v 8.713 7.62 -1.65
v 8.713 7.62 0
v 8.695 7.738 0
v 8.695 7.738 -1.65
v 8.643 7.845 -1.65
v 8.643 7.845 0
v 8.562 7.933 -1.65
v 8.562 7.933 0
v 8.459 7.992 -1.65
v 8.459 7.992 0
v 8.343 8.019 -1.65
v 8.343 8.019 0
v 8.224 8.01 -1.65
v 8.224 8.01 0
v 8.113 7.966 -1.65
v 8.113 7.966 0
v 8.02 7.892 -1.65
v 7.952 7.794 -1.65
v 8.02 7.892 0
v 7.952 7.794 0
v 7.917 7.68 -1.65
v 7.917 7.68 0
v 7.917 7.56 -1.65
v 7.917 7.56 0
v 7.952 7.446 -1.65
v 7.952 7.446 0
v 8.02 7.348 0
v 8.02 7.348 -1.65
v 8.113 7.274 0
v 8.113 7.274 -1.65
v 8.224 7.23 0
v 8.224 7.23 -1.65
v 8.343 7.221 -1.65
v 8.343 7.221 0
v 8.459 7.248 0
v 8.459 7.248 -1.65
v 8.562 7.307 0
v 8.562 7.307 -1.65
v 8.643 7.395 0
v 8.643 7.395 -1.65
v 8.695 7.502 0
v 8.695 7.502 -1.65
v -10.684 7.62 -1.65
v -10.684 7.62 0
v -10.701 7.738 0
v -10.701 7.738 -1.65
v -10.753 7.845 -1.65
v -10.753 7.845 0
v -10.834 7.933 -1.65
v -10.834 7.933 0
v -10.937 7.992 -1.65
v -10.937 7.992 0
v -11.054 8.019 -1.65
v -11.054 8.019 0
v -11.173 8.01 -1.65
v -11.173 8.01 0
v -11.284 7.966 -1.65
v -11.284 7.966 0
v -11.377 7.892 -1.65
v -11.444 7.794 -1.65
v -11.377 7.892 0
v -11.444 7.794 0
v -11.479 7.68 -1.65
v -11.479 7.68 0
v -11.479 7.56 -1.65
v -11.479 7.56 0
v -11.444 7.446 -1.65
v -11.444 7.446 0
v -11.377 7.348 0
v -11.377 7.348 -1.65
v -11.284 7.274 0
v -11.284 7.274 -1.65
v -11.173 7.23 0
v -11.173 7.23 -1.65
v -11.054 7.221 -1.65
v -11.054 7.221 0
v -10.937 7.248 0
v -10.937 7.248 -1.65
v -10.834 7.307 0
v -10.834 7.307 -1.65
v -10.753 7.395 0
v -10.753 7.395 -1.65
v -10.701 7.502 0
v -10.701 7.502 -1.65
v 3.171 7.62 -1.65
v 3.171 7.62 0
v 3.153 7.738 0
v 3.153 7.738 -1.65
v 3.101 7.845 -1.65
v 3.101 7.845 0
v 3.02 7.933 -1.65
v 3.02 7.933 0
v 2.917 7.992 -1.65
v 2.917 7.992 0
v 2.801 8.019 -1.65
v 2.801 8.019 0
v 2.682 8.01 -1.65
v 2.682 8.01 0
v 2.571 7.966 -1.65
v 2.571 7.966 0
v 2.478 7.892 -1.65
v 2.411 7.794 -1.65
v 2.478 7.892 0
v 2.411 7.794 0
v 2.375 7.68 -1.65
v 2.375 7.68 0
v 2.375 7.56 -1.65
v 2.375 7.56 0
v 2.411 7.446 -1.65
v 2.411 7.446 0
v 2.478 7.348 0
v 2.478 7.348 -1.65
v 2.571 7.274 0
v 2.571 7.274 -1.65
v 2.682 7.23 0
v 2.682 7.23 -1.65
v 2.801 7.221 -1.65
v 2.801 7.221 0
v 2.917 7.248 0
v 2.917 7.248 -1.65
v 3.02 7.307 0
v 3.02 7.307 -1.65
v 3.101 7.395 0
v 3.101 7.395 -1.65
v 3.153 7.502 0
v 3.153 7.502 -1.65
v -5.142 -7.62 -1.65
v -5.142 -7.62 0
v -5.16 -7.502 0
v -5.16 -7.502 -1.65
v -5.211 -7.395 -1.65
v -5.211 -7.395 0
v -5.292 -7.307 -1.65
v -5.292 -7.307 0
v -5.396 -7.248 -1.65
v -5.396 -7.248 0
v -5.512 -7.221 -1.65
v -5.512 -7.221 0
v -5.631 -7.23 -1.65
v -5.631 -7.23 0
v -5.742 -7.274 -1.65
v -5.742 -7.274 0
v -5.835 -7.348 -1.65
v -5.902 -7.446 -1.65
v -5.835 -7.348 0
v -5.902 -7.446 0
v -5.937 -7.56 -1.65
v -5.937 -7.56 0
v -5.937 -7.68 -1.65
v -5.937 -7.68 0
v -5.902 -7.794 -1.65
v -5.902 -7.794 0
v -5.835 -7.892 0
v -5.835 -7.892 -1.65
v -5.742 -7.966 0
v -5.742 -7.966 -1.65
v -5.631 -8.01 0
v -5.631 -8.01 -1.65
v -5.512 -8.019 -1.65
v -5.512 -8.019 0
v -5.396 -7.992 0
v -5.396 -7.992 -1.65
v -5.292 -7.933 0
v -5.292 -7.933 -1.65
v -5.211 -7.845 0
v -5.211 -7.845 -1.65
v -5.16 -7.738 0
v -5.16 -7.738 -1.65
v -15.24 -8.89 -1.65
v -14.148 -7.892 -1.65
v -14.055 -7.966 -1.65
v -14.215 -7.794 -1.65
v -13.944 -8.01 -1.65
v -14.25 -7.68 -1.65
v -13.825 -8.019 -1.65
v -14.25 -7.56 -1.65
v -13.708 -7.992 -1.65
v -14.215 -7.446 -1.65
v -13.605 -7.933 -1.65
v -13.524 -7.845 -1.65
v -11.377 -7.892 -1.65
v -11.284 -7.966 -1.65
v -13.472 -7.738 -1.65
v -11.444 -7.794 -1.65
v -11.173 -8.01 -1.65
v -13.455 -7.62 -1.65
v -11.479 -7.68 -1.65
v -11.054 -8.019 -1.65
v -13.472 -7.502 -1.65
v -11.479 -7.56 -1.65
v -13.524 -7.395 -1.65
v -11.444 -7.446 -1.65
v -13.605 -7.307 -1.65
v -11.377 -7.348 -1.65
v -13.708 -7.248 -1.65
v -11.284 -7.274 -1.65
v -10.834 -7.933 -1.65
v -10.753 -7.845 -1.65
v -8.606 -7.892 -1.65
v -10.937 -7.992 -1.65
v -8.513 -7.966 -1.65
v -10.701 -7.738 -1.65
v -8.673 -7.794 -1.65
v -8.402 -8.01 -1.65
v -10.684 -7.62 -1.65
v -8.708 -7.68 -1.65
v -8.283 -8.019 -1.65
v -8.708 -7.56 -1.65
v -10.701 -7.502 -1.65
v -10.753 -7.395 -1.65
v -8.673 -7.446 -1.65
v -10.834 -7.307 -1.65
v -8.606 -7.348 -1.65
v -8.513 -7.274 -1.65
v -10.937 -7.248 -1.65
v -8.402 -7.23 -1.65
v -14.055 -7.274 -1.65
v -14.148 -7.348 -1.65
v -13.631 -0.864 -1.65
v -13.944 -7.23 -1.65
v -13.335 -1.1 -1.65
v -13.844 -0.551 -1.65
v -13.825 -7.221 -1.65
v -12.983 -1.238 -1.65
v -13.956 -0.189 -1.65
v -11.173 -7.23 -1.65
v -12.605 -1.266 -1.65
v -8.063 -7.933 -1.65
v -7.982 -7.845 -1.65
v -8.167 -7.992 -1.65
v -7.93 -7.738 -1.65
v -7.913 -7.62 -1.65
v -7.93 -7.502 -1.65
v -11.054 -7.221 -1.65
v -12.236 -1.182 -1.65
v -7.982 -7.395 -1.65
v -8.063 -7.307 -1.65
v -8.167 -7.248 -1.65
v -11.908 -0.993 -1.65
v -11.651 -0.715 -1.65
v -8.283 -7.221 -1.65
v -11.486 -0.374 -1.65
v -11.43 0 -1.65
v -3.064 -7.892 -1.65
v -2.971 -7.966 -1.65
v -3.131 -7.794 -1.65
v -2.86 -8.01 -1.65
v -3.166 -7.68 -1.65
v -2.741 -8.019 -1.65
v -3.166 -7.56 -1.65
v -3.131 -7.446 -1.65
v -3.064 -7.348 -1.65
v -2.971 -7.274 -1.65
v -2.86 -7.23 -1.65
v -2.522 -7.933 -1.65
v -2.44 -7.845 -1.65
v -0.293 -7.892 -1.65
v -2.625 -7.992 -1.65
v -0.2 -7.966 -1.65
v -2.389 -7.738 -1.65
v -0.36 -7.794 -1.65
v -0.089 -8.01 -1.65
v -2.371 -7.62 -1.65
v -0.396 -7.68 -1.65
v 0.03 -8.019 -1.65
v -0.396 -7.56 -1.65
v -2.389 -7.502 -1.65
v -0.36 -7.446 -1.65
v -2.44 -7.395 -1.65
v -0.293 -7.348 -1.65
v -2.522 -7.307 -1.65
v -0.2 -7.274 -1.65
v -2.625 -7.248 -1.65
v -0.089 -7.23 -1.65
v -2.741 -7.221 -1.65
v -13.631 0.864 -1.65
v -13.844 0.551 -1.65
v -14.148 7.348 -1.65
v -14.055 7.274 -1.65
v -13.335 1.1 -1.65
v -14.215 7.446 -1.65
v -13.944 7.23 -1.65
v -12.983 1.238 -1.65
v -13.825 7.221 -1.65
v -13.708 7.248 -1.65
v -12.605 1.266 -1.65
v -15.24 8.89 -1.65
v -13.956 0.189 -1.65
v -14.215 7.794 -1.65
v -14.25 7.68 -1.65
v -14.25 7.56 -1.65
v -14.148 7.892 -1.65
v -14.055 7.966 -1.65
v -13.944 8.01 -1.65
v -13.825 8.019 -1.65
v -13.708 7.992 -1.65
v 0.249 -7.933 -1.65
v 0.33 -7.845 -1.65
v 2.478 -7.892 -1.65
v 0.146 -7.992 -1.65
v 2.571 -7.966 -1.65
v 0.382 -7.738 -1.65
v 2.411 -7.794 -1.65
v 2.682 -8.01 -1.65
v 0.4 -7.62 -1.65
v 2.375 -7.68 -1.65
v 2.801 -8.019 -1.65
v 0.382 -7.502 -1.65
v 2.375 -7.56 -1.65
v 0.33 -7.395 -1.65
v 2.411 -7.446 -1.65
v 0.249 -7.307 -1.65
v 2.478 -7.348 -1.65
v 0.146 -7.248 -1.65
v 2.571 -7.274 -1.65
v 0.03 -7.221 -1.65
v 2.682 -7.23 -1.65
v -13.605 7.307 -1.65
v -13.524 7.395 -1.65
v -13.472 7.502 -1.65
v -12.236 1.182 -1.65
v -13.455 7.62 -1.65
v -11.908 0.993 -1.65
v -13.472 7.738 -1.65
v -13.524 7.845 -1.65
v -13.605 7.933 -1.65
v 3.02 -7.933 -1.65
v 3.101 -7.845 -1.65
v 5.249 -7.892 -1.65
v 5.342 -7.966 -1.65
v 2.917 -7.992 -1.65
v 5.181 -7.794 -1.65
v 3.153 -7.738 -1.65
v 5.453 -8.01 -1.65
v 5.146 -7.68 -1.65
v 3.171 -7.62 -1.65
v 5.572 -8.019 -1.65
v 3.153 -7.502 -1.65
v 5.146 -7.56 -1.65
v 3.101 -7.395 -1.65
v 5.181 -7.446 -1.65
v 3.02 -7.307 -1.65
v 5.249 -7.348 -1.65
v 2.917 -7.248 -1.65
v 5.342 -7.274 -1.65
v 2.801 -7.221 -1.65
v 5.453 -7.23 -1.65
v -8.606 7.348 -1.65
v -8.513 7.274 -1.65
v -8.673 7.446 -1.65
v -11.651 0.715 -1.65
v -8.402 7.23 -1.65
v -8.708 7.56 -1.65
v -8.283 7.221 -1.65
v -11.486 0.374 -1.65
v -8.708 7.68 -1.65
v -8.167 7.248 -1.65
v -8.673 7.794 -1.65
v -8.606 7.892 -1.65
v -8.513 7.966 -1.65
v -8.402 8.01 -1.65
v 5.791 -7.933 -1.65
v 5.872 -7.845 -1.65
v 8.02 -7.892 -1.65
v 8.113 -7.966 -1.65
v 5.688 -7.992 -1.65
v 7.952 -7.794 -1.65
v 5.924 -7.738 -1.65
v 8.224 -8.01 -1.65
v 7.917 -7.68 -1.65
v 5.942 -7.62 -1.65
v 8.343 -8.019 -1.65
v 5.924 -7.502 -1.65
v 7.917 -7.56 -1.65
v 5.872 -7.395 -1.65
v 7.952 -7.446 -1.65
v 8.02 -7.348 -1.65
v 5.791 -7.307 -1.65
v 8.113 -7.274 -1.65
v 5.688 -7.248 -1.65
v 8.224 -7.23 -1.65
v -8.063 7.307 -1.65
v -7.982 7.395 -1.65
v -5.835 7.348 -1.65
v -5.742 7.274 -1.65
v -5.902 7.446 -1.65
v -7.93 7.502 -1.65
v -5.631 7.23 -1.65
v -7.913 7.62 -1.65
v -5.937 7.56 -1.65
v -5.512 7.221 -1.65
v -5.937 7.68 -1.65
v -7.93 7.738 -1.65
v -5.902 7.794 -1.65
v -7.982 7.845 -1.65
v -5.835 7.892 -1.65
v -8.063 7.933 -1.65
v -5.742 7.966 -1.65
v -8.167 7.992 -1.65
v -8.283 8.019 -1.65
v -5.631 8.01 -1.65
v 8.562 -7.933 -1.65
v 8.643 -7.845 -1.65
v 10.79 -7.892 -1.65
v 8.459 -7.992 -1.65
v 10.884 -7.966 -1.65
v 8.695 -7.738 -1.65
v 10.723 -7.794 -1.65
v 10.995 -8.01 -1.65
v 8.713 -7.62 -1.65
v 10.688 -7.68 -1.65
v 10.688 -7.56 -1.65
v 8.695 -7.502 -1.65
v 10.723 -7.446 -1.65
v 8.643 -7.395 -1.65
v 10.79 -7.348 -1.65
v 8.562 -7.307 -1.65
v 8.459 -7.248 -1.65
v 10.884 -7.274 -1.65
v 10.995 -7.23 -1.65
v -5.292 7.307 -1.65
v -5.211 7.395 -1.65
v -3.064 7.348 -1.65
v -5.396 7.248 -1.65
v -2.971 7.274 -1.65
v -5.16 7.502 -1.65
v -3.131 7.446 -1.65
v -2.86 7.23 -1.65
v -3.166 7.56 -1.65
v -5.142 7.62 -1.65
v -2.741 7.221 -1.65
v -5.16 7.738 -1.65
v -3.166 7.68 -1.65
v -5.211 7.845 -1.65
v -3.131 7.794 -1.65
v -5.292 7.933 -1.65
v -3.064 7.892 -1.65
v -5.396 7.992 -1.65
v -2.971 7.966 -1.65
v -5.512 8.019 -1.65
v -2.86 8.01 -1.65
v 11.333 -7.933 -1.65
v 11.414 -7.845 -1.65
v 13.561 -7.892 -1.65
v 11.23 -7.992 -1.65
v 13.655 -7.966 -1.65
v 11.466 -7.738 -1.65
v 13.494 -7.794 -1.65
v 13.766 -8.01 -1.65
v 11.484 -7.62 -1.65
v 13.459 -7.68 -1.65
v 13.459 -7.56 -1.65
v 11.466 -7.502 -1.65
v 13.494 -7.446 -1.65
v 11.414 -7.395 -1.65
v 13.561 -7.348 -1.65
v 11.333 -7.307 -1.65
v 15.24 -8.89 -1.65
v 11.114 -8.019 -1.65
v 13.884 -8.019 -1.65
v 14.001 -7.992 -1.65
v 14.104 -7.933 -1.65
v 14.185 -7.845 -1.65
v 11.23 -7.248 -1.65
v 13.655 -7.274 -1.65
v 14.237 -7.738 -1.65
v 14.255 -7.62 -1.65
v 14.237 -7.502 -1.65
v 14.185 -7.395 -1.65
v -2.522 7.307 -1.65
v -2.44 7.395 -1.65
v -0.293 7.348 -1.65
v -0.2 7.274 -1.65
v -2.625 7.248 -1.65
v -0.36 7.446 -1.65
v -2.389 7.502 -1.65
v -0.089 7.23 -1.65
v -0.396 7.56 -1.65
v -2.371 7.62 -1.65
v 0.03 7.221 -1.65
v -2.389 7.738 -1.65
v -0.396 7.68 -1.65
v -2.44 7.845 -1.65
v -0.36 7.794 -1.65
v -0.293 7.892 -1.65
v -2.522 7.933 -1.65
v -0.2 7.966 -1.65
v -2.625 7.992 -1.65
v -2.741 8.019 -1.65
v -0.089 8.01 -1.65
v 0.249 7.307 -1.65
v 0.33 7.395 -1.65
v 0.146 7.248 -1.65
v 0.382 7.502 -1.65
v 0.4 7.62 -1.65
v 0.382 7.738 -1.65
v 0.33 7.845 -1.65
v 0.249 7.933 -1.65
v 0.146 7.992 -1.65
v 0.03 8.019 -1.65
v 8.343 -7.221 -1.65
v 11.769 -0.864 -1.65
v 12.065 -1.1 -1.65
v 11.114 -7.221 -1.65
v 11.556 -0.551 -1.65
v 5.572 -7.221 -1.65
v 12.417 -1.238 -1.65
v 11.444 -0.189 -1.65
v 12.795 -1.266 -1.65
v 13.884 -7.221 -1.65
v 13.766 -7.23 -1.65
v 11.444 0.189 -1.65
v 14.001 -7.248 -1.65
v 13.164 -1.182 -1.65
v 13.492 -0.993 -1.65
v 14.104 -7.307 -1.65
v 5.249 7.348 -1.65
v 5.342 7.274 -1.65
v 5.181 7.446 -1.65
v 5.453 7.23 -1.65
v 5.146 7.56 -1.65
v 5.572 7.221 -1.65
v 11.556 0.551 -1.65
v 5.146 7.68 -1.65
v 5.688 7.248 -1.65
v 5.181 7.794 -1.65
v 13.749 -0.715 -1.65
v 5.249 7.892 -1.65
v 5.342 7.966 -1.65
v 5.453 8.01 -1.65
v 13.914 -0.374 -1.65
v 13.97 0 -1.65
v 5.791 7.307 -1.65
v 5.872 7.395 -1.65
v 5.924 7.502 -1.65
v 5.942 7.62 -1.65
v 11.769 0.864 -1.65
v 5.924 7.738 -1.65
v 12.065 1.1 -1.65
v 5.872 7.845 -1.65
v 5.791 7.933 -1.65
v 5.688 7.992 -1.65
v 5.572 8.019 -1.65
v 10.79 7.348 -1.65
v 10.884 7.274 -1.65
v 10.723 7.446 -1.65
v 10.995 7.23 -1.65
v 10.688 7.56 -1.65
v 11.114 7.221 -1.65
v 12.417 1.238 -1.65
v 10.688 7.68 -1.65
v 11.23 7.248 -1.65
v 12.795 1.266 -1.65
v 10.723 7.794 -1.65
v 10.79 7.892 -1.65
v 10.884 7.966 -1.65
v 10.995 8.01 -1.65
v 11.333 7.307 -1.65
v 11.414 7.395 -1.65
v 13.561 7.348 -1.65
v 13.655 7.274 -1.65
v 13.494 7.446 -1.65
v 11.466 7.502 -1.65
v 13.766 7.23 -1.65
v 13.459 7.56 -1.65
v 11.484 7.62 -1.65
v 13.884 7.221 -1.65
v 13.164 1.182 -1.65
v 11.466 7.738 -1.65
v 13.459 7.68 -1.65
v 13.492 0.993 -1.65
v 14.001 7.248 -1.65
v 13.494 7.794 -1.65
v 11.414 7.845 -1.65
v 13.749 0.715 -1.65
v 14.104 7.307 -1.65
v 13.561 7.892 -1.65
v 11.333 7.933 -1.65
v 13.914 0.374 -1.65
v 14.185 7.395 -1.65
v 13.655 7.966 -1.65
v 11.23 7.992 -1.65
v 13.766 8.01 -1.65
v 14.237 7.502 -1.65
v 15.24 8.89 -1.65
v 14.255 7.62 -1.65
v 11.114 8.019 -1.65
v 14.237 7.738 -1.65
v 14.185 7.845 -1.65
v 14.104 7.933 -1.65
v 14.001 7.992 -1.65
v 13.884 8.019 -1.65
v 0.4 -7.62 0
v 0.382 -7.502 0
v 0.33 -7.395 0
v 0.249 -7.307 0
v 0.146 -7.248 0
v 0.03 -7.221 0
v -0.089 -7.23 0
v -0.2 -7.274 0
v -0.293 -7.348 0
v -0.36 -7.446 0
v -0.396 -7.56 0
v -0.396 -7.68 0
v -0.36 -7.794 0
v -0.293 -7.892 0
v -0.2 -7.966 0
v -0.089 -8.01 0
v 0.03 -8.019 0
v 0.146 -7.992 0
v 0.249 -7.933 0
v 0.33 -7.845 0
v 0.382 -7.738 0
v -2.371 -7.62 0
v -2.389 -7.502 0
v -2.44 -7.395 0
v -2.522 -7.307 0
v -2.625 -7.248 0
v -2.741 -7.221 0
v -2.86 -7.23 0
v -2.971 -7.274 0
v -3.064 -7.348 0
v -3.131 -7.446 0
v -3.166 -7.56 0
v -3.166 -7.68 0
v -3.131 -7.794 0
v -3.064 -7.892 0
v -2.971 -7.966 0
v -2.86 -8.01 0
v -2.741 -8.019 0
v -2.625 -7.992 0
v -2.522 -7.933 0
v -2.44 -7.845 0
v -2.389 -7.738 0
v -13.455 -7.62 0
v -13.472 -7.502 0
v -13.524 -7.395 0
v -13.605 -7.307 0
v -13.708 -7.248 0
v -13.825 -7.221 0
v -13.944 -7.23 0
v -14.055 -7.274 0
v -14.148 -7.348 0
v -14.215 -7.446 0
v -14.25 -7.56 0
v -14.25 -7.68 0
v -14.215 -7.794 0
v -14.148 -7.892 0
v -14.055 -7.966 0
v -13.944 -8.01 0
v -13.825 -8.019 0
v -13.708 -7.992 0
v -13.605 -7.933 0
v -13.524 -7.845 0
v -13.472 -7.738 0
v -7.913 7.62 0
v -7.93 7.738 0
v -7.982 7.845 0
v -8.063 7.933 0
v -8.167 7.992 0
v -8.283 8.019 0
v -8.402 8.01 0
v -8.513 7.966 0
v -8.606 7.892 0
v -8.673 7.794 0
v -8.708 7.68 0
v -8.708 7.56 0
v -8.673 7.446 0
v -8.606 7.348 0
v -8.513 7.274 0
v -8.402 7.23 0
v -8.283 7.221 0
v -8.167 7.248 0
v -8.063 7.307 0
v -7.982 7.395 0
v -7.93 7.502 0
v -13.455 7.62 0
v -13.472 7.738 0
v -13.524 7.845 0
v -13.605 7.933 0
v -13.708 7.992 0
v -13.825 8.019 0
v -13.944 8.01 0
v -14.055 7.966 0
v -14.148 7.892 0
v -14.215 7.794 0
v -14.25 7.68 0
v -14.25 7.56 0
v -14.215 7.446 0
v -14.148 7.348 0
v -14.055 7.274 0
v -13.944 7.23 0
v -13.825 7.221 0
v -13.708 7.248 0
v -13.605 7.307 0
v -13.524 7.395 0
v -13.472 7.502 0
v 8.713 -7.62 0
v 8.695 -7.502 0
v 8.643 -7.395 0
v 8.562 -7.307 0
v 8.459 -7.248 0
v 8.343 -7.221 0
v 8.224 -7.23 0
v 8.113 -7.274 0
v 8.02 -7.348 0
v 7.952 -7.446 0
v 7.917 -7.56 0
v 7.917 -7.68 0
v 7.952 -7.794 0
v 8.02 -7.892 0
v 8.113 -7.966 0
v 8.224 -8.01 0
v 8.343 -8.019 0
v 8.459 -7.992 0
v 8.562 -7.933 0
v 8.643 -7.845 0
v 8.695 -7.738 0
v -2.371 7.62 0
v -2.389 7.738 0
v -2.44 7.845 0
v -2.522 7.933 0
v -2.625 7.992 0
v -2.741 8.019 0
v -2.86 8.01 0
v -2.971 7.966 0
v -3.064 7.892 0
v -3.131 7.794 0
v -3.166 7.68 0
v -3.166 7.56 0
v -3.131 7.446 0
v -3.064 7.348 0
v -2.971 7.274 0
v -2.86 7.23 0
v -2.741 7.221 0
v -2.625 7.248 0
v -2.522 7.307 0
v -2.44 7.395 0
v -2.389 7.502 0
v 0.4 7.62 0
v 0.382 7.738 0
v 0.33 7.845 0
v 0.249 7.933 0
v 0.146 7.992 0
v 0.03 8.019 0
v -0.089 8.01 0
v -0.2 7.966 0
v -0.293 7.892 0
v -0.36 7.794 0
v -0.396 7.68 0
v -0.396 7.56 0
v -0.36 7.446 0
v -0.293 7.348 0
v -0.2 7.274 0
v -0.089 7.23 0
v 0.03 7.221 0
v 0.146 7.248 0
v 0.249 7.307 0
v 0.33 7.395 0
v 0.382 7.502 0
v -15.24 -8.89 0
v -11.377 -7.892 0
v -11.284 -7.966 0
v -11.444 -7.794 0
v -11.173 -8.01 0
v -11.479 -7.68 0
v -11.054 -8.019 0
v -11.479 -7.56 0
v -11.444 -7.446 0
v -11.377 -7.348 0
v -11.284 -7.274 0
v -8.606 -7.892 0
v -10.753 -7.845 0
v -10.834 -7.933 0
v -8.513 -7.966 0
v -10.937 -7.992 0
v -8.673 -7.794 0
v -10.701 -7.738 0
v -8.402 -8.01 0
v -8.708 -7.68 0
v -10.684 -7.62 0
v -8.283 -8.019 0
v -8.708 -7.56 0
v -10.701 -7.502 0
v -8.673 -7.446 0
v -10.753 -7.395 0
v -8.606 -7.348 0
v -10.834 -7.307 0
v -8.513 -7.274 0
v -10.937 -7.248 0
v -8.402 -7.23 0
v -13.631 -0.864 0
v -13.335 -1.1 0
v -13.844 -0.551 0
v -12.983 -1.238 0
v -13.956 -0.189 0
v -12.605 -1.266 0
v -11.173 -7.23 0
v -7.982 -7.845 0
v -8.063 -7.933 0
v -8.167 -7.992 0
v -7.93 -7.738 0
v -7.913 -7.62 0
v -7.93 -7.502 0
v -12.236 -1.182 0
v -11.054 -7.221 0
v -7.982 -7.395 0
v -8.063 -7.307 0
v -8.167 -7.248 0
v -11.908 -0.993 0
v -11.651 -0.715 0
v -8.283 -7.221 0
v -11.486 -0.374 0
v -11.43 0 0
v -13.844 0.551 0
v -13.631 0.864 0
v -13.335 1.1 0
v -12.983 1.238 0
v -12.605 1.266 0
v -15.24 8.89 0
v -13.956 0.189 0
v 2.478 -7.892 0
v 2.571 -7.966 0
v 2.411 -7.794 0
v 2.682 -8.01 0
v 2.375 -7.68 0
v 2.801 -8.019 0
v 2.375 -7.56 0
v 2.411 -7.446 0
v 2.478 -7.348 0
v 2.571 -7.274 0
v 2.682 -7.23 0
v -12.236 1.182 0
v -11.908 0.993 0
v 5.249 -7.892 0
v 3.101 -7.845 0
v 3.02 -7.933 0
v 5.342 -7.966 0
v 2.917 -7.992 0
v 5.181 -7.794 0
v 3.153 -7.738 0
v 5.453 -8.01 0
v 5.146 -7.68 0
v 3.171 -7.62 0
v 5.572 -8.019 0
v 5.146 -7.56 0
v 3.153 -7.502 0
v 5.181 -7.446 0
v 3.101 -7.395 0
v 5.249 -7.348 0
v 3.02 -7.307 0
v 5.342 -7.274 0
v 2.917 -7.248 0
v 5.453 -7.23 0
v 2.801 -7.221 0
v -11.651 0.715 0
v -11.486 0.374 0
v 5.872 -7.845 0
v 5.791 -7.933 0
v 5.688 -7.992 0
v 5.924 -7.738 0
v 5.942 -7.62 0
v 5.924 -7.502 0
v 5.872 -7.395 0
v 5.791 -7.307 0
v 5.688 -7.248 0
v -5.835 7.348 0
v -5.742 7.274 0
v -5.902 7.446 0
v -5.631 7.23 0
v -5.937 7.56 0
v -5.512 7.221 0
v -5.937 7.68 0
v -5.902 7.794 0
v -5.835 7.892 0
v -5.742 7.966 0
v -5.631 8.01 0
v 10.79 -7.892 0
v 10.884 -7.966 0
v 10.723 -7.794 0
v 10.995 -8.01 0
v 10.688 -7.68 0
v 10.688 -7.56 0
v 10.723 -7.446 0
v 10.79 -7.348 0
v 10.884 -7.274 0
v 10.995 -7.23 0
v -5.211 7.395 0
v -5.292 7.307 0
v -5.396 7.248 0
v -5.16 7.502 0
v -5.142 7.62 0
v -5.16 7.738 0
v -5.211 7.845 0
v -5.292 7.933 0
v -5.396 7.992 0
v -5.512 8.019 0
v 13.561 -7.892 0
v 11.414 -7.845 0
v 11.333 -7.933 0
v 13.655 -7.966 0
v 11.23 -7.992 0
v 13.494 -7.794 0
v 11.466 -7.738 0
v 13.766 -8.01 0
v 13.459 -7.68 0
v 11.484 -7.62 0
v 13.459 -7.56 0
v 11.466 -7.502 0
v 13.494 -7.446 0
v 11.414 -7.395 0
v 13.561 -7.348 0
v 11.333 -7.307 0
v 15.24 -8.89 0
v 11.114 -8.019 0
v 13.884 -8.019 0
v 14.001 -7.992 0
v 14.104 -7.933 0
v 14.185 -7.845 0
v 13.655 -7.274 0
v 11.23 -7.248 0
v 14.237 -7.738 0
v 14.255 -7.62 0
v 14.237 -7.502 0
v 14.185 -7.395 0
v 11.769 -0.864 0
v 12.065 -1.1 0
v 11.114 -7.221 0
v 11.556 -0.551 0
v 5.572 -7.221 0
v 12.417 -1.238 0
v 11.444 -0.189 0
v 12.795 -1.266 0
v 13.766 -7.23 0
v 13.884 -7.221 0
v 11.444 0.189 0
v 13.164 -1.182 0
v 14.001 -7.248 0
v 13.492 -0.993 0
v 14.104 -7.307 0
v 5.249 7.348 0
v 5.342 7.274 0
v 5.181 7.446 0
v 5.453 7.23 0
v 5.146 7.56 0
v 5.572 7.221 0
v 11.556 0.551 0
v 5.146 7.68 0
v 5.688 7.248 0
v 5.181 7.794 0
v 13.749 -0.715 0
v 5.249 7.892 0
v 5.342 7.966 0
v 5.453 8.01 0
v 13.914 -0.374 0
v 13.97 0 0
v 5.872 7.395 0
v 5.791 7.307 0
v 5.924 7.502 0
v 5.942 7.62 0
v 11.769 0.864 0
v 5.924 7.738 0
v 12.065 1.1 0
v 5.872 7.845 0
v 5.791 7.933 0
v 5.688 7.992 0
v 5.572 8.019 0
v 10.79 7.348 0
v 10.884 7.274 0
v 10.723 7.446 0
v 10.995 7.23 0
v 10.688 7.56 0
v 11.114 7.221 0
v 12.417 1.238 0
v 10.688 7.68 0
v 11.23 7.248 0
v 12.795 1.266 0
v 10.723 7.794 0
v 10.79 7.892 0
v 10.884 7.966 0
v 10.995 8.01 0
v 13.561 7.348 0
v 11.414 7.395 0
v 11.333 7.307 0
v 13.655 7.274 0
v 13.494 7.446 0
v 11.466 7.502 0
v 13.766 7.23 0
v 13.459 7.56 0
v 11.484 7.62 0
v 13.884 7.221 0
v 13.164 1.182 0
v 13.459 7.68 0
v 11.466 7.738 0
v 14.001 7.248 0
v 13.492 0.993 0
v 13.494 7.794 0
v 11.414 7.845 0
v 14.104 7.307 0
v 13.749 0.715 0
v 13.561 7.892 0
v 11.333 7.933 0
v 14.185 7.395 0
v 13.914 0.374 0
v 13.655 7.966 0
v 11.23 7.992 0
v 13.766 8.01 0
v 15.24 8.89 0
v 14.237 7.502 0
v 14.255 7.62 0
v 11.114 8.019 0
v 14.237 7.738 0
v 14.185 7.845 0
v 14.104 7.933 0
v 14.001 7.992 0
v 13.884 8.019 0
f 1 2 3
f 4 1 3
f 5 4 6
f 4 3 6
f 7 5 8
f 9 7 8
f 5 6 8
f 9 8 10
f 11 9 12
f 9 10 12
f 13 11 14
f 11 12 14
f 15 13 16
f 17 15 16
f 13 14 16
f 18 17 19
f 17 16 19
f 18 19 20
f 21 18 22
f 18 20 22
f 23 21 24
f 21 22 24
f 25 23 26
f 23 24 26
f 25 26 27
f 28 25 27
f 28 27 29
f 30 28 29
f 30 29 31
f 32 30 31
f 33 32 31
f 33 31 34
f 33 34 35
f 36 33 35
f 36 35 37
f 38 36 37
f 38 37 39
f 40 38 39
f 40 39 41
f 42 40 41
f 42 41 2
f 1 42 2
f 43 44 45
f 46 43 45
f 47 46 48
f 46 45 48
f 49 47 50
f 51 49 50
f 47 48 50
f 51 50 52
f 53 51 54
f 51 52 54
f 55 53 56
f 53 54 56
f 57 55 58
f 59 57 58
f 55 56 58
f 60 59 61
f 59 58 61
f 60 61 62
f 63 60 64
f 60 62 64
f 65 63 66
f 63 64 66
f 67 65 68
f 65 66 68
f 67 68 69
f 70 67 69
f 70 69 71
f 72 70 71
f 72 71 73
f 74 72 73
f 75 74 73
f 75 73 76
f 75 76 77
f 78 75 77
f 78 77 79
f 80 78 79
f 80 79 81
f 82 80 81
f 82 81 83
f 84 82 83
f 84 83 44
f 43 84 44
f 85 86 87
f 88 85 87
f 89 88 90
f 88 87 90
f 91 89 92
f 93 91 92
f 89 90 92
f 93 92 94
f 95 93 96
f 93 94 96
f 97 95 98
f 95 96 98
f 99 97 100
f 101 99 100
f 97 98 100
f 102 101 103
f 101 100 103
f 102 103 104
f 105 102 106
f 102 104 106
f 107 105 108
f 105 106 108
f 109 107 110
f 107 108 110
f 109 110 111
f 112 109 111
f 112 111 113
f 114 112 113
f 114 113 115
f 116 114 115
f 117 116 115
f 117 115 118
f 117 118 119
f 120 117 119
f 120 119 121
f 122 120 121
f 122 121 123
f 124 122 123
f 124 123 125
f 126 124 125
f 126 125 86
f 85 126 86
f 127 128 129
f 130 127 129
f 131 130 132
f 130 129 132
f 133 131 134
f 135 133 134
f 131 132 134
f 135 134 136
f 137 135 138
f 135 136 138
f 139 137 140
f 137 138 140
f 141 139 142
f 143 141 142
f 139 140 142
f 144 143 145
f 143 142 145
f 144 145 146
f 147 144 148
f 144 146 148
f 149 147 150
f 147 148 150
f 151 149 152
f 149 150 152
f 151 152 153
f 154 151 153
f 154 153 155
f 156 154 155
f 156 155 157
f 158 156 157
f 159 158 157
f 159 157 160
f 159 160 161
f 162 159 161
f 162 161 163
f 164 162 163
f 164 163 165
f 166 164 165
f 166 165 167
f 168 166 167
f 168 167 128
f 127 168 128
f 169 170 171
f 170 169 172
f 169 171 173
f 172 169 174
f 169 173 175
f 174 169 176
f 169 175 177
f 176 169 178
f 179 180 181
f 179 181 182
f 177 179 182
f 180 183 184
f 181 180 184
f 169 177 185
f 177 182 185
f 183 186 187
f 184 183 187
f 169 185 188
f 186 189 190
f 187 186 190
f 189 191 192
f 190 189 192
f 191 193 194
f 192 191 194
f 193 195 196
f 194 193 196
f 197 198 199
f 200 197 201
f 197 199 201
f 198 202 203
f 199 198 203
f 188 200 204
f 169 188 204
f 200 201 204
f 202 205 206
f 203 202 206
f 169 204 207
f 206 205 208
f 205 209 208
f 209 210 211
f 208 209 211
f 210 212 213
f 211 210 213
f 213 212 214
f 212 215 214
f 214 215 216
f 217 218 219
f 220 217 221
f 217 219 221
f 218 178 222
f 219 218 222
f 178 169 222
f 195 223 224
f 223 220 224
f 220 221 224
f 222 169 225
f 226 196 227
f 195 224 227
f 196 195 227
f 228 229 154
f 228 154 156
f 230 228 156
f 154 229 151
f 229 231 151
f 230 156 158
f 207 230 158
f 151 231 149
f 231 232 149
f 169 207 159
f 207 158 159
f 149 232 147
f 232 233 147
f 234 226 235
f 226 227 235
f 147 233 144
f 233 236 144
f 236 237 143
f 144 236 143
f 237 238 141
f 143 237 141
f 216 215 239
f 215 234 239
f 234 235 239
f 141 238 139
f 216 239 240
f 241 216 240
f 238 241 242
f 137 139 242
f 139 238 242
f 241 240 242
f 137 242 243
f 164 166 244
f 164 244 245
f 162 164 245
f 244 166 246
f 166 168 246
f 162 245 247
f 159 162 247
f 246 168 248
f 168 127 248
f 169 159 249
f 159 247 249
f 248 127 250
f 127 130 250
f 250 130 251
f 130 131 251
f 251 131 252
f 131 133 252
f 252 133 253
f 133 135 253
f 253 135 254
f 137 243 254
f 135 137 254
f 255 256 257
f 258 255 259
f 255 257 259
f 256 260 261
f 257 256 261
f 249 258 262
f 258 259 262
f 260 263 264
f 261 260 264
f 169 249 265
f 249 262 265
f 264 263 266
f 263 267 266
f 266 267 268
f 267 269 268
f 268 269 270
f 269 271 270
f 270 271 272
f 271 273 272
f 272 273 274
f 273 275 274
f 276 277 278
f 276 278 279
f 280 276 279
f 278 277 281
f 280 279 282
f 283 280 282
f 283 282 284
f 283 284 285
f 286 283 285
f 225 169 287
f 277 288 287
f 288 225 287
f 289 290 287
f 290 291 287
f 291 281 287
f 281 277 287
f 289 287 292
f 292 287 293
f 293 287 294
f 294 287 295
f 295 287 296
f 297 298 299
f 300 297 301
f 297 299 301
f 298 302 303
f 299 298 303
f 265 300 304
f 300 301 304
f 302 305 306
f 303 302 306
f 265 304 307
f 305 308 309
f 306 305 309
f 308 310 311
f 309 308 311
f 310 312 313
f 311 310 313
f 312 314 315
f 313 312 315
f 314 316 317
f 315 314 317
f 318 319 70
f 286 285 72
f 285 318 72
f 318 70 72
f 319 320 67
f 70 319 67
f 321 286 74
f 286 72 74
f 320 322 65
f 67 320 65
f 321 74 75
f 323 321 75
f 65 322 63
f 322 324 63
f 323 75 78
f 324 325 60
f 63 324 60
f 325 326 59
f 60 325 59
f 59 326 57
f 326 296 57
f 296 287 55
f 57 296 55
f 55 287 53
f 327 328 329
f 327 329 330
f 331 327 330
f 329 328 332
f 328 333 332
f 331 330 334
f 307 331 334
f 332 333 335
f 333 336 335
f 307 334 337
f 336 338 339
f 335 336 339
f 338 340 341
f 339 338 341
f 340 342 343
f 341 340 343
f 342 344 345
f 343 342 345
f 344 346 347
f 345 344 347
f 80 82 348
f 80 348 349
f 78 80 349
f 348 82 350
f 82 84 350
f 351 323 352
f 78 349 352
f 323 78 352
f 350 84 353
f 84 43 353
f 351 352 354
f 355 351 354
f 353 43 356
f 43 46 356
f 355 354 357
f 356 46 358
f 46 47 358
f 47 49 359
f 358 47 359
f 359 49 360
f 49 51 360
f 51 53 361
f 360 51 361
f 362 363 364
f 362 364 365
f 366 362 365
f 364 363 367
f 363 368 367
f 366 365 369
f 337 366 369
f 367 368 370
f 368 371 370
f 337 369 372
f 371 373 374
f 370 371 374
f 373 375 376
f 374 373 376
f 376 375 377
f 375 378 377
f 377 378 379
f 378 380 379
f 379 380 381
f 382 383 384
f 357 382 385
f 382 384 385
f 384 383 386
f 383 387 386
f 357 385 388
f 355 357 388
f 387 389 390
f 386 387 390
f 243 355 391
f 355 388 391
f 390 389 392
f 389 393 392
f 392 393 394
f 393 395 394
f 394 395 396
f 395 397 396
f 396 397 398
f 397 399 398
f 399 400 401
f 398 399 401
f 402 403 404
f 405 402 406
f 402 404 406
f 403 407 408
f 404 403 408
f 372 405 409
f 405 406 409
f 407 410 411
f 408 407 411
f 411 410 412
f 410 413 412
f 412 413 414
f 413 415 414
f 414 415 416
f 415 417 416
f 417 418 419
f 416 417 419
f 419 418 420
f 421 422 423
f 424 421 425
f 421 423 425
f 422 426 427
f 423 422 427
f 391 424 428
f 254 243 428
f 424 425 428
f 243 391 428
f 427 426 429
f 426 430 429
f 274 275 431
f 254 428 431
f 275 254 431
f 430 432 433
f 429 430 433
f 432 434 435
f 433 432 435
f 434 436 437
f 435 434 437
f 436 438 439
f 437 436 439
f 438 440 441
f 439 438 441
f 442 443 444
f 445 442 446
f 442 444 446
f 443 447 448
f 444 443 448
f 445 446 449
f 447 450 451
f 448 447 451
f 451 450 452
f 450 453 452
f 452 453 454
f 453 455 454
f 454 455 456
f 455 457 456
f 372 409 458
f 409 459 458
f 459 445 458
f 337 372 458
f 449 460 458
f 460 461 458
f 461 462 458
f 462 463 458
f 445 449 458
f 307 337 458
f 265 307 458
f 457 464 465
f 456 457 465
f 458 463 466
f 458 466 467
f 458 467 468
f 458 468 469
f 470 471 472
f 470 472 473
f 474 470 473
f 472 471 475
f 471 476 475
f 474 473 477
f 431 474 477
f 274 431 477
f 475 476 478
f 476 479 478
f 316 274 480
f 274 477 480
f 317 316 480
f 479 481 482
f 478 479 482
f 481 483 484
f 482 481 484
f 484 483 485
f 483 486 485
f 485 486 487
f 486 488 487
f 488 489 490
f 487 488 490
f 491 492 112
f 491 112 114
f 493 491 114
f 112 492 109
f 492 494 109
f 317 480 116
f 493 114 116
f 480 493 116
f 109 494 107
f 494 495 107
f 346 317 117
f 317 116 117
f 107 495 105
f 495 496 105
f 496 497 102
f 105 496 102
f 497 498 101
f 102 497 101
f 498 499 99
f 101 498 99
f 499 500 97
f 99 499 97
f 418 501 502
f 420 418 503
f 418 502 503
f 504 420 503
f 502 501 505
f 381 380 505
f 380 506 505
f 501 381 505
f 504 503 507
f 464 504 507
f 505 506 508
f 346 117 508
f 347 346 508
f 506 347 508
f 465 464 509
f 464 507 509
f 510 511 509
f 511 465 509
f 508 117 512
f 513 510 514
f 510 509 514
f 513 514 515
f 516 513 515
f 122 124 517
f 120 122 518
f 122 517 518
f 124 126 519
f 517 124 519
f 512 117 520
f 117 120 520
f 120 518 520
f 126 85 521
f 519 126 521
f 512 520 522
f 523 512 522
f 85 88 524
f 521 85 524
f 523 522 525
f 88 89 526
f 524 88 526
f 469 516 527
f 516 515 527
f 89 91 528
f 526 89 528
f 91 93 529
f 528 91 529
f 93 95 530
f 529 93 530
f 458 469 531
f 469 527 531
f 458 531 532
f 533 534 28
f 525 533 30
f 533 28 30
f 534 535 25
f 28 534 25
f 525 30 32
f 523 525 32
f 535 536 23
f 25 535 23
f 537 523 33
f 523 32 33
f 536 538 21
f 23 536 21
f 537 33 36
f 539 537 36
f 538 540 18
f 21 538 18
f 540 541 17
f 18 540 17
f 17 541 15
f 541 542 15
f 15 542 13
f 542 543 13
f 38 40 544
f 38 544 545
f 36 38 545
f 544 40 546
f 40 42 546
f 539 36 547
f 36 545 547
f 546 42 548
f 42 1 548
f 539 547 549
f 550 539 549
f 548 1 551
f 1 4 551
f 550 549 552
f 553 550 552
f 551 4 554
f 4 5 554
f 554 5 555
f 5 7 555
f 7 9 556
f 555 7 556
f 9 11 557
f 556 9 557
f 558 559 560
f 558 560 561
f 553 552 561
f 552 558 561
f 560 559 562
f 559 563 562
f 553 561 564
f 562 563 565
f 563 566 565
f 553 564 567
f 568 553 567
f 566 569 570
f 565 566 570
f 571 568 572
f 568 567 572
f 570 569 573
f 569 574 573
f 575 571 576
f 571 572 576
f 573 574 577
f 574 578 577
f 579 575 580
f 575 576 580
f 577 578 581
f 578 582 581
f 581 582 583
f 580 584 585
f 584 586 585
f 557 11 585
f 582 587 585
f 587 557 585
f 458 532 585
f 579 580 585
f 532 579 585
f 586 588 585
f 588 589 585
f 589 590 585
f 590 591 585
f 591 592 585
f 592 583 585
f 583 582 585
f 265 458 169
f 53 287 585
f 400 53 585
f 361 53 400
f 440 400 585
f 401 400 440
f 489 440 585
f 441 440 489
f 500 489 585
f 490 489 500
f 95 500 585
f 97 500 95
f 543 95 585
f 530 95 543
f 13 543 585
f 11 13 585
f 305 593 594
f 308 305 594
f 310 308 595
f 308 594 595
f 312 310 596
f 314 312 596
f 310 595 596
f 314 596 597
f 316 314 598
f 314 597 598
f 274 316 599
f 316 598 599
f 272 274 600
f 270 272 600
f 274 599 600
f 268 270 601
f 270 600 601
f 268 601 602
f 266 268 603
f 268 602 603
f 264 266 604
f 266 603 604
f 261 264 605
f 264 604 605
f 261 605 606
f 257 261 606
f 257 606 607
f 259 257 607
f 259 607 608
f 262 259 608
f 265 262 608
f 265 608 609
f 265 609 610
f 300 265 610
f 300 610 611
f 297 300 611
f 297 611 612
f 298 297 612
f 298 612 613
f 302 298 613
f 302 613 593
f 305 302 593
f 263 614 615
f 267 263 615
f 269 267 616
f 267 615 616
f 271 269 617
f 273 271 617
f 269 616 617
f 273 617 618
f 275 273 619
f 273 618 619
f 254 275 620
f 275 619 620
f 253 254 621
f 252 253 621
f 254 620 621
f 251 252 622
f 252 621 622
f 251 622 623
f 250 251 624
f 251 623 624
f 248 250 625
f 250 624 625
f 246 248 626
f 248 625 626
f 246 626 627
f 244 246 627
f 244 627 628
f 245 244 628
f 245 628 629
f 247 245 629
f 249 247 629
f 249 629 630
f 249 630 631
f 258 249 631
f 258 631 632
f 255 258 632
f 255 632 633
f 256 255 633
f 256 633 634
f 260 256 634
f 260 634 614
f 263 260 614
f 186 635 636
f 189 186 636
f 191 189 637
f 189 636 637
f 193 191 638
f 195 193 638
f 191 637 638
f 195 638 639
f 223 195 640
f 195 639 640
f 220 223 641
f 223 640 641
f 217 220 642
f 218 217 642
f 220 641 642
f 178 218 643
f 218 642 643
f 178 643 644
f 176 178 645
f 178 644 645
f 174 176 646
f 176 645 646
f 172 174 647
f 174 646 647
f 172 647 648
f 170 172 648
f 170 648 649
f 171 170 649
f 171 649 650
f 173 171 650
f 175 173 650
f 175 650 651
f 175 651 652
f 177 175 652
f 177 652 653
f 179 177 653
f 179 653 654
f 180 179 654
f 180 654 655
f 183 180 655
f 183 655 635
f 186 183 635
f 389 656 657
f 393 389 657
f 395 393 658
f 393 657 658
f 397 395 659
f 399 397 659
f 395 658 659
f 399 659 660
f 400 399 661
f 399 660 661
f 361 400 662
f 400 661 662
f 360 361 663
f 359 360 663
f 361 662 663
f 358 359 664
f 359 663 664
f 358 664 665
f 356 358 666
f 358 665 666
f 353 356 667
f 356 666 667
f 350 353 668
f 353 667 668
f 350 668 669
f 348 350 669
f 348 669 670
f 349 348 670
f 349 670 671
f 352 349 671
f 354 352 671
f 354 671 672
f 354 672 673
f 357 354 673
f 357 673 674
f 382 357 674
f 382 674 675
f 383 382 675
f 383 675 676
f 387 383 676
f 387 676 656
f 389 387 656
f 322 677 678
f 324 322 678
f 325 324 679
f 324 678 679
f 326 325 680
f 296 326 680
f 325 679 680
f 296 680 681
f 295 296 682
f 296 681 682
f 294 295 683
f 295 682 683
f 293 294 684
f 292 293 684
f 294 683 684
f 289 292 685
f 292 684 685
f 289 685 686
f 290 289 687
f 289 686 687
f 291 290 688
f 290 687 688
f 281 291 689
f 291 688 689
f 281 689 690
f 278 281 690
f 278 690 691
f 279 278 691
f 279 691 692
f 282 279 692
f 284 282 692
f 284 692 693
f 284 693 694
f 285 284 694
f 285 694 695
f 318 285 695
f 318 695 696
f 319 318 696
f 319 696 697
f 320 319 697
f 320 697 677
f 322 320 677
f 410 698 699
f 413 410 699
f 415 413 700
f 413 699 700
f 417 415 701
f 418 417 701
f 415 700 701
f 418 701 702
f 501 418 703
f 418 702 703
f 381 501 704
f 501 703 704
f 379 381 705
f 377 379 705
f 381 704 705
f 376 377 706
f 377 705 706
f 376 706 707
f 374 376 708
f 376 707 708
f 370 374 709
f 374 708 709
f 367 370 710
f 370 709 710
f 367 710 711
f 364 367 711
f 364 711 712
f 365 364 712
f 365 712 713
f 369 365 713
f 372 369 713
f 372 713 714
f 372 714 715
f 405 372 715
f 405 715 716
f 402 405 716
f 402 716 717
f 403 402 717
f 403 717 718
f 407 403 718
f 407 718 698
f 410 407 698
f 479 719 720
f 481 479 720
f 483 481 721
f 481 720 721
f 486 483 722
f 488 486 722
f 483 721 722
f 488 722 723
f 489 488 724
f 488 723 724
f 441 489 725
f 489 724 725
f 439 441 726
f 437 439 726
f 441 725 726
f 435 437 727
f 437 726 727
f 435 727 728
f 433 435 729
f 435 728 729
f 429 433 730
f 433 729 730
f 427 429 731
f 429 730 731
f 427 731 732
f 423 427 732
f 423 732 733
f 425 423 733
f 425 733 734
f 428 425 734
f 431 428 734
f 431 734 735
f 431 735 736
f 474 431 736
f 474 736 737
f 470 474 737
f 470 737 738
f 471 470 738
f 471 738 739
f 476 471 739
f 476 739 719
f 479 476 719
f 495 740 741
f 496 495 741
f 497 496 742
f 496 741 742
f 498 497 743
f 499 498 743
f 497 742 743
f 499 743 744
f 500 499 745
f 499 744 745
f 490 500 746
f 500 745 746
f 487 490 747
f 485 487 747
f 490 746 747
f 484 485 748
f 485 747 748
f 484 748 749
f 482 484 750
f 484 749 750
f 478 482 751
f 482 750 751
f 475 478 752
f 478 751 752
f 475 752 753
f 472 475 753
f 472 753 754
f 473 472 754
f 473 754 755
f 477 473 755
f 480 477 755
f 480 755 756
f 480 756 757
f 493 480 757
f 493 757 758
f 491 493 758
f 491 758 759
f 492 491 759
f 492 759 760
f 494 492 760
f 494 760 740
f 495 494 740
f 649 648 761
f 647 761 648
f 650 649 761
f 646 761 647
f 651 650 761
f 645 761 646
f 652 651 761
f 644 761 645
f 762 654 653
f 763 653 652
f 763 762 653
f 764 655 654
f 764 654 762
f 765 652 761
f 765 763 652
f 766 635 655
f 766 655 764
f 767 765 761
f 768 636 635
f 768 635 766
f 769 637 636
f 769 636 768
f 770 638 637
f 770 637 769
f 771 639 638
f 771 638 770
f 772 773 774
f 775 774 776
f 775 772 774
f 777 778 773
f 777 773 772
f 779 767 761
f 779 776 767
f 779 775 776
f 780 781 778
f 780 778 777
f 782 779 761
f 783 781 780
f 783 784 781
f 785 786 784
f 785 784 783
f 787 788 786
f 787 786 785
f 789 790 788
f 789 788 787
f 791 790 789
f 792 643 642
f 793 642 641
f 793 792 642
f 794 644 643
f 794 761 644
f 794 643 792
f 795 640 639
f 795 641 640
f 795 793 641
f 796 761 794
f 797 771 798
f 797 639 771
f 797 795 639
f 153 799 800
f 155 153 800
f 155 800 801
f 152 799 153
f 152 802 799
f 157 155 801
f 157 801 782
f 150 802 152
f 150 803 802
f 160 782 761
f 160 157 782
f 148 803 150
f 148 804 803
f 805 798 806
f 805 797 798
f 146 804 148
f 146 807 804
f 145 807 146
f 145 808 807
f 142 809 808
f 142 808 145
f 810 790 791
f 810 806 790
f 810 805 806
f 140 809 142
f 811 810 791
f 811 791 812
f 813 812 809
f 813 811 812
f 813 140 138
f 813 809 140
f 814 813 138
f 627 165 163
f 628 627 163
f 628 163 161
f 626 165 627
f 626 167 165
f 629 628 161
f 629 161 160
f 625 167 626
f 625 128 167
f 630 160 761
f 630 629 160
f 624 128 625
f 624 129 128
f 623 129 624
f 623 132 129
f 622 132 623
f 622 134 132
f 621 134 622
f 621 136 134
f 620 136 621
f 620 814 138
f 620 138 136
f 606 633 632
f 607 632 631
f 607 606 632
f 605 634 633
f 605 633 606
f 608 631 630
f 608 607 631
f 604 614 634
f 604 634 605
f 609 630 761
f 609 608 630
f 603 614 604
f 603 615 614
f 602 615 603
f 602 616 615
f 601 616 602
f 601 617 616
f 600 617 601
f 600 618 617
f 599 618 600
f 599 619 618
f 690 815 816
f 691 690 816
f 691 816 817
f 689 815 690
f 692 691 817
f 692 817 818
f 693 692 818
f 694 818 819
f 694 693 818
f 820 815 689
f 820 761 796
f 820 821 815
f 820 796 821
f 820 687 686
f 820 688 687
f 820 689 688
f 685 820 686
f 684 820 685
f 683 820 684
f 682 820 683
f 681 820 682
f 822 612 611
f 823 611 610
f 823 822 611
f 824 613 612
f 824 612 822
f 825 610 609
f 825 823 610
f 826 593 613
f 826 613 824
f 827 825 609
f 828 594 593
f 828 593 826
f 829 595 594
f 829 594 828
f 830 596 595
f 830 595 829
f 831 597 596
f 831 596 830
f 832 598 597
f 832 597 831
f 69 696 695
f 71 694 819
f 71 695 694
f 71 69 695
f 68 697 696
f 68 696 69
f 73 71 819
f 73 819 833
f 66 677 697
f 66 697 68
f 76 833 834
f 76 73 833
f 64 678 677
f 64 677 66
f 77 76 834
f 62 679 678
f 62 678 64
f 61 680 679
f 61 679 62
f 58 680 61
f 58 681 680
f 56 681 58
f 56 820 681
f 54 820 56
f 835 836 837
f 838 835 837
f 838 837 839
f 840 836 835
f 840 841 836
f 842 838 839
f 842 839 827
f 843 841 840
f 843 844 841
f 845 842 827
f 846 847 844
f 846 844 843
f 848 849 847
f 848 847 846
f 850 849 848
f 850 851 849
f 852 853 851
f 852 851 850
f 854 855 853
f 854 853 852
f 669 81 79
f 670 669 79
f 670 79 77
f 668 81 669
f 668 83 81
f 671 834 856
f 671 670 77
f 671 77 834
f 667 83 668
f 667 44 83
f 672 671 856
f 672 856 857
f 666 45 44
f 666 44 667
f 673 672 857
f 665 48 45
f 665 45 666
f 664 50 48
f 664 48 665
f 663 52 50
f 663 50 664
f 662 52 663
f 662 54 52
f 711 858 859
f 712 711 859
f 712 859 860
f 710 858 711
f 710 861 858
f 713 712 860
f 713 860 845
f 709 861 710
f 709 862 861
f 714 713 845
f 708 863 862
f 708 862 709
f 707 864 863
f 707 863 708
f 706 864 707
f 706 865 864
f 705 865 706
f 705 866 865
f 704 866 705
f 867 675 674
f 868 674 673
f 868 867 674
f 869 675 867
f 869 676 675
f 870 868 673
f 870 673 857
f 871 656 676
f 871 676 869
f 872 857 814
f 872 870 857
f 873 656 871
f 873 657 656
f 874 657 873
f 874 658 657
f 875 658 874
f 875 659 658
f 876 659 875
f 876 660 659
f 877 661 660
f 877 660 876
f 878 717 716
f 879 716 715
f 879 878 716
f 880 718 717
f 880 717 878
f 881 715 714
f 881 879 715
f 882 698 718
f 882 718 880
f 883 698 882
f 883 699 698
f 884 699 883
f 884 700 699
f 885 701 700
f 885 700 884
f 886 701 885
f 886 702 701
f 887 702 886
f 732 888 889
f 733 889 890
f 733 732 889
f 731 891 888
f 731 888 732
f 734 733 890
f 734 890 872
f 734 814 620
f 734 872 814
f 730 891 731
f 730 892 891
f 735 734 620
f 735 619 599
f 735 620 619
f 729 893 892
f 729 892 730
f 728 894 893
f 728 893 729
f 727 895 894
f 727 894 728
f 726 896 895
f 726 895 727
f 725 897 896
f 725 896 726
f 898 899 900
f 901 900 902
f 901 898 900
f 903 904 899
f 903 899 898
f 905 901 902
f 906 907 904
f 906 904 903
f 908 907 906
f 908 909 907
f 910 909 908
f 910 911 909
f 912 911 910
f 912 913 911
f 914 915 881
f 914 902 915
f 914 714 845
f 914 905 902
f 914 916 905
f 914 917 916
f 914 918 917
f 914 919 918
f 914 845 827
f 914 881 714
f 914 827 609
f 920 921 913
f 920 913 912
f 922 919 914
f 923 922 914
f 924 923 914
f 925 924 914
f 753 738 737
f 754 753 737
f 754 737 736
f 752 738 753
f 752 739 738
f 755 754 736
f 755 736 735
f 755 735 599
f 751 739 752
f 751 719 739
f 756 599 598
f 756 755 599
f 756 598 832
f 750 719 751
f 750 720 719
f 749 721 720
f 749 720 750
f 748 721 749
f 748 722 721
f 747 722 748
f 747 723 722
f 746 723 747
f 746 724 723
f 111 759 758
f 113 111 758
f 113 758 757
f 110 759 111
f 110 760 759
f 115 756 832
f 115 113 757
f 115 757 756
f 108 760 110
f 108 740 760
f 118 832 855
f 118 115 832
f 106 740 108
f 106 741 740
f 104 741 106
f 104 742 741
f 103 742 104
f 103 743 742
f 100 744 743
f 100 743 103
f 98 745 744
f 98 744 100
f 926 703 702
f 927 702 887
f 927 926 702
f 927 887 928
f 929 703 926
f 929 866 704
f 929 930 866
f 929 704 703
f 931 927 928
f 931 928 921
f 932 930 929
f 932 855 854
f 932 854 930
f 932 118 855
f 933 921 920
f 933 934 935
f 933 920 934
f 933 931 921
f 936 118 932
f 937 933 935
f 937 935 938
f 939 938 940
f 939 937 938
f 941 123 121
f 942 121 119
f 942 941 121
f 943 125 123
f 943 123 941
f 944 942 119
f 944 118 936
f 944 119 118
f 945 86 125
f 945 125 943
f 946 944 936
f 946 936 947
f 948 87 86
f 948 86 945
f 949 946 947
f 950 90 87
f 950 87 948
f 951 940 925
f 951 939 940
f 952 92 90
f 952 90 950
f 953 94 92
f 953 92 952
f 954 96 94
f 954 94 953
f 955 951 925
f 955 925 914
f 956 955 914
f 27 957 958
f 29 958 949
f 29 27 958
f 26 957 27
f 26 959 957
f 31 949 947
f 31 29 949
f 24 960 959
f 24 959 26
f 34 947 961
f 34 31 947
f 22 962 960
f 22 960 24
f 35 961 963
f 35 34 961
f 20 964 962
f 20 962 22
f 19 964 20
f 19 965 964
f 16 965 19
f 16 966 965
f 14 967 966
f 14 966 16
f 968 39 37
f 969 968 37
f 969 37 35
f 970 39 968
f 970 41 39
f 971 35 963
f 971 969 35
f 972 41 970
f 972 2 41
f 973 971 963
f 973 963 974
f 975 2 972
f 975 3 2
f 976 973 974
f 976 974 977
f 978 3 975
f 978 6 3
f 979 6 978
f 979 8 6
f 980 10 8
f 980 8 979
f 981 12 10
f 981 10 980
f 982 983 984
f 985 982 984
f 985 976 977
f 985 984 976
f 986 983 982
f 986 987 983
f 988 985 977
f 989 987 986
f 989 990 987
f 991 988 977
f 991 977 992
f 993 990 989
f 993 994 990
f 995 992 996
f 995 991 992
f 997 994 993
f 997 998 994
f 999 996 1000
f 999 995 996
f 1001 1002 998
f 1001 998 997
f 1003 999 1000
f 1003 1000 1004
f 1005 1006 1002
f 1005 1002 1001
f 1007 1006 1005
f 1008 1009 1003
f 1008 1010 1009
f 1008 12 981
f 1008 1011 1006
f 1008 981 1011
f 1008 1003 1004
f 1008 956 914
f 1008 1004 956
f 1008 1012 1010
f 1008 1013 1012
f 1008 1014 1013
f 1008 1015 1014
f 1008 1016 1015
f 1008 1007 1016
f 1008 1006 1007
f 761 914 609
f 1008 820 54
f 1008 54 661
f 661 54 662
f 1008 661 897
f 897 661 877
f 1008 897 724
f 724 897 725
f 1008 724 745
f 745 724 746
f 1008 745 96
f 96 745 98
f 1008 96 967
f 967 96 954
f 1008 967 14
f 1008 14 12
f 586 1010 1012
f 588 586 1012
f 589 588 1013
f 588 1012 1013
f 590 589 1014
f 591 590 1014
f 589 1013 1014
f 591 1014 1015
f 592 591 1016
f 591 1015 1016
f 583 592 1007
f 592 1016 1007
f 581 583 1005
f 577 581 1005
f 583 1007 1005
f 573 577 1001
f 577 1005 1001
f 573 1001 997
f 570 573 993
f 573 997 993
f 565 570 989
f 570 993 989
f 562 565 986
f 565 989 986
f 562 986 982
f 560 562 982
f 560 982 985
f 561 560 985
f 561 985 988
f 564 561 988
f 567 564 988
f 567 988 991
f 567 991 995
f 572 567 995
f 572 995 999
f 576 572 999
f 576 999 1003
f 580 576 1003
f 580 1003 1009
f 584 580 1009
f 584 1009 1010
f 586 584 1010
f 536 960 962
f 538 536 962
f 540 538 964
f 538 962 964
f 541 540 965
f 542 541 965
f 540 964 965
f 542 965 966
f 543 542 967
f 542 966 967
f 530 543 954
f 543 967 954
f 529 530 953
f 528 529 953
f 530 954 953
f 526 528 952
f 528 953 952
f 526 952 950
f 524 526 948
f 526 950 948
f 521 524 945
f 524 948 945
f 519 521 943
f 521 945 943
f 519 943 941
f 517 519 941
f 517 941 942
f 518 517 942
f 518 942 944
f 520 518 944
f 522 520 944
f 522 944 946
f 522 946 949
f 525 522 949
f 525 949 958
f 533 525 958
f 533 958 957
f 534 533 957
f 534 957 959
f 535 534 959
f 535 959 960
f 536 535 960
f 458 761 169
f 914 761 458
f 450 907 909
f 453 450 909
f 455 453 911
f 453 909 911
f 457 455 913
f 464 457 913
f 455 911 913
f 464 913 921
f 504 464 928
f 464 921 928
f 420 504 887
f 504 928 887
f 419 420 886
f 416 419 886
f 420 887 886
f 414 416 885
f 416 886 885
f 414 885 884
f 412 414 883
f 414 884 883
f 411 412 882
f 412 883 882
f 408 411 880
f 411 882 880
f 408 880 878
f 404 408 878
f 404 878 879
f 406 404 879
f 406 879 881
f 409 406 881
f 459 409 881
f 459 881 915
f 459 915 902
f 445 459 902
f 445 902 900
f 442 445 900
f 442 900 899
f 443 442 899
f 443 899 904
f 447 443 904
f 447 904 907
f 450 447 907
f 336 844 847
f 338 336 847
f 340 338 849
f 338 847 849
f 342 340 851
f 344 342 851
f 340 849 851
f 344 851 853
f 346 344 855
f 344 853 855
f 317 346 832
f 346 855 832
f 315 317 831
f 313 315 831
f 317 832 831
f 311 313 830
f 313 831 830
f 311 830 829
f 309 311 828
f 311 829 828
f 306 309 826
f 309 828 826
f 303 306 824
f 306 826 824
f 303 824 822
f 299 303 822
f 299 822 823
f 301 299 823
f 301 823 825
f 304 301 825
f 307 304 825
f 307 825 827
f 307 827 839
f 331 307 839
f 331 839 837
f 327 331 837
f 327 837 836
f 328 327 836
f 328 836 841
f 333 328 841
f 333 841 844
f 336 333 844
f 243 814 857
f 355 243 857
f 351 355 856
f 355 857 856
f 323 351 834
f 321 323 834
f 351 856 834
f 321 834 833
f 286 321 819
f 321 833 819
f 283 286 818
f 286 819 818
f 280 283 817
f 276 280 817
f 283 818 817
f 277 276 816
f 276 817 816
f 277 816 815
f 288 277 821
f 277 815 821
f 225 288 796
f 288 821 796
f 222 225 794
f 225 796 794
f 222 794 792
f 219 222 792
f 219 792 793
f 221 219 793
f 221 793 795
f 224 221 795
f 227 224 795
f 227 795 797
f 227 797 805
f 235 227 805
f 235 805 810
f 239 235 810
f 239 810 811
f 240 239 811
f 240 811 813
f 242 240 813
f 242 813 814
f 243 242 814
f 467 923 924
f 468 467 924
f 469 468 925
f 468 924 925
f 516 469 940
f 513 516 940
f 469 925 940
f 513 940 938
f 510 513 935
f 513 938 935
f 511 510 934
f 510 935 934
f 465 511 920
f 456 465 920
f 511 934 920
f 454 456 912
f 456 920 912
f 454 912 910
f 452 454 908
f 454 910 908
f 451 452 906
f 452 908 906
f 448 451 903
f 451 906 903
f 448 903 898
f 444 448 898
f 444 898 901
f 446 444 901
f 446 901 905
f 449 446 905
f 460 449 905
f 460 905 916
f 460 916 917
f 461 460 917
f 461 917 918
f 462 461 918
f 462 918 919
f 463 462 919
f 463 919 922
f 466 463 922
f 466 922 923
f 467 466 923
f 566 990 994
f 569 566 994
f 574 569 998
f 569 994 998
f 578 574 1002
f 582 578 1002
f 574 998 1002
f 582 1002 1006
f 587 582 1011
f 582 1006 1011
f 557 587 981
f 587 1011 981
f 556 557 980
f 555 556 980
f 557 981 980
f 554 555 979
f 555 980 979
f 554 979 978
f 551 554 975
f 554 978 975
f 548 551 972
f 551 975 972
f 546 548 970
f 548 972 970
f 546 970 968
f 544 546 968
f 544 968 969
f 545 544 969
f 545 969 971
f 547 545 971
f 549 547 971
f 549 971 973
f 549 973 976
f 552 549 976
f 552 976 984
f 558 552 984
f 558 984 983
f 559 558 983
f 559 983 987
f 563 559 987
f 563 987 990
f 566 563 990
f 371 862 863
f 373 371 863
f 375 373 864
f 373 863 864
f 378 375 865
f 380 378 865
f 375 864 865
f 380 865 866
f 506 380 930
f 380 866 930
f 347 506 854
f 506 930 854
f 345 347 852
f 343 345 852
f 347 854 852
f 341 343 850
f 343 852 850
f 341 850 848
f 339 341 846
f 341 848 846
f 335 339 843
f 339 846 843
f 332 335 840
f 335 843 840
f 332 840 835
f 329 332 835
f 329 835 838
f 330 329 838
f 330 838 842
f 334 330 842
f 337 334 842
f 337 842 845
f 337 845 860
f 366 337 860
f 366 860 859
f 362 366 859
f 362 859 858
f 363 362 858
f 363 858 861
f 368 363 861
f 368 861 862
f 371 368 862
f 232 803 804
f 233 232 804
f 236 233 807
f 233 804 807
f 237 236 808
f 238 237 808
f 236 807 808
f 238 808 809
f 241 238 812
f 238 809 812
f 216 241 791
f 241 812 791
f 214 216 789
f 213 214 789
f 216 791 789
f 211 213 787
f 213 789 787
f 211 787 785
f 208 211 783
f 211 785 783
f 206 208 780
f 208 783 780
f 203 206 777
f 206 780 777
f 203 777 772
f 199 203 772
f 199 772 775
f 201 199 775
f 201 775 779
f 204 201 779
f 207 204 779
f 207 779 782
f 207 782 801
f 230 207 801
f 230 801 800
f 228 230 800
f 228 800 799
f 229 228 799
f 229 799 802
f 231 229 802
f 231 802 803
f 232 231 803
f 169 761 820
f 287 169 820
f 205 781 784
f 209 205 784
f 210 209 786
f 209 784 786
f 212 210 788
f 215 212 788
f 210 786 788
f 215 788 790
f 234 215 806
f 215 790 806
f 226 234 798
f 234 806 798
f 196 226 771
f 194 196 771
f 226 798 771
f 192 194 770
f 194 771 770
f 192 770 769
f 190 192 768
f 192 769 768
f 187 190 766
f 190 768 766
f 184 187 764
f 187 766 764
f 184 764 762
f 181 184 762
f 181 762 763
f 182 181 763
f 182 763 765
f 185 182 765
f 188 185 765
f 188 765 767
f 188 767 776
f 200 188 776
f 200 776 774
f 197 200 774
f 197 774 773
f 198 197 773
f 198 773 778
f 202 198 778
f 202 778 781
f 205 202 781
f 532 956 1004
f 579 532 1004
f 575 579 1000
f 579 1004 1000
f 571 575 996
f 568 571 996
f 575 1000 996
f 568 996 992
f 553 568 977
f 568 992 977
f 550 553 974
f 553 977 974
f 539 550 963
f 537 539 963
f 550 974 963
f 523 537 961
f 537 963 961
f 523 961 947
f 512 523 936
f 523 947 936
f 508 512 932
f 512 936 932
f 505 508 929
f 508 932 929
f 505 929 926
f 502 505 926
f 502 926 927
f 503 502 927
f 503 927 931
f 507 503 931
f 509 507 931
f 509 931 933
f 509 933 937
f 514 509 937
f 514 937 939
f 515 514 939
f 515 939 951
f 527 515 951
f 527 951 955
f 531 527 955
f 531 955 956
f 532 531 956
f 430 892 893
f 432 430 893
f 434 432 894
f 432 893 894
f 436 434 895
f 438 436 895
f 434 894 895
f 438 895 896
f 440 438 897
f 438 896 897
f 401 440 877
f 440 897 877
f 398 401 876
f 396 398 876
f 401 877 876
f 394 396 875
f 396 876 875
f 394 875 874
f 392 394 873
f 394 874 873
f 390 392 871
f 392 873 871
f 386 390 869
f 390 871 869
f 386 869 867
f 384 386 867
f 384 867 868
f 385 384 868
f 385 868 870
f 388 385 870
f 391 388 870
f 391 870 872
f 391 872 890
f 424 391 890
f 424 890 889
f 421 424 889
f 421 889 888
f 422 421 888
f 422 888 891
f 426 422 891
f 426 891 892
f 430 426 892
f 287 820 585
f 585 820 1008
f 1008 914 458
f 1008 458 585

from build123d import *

# Parameters (mm, degrees)
SKETCH040_W            = 30.48
SKETCH040_H            = 17.78
PAD015_DEPTH           = 1.65
SKETCH042_R            = 1.27
POCKET024_DEPTH        = 1.651
SKETCH044_R            = 0.4
POCKET025_DEPTH        = 1.651
LINEARPATTERN_COUNT    = 12
LINEARPATTERN_PITCH    = 2.770909
LINEARPATTERN001_COUNT = 12
LINEARPATTERN001_PITCH = 2.770909


with BuildPart() as part:
    # Sketch040 → Pad015 (new body)
    with BuildSketch(Plane.XY):
        Rectangle(SKETCH040_W, SKETCH040_H)
    extrude(amount=-PAD015_DEPTH)

    # Sketch042 → Pocket024 (cut, through all)
    with BuildSketch(Plane.XY):
        with Locations((-12.7, 0)):
            Circle(SKETCH042_R)
        with Locations((12.7, 0)):
            Circle(SKETCH042_R)
    extrude(amount=-POCKET024_DEPTH, mode=Mode.SUBTRACT)

    # Sketch044 → Pocket025 (cut, through all)
    with BuildSketch(Plane.XY):
        with Locations((0, -7.62)):
            Circle(SKETCH044_R)
        with Locations((0, 7.62)):
            Circle(SKETCH044_R)
    pocket025 = extrude(amount=-POCKET025_DEPTH, mode=Mode.SUBTRACT)

    # LinearPattern: Pocket025 ×12
    with Locations(*[(i * LINEARPATTERN_PITCH, 0, 0) for i in range(1, LINEARPATTERN_COUNT)]):
        add(pocket025, mode=Mode.SUBTRACT)

    # LinearPattern001: Pocket025 ×12
    with Locations(*[(-i * LINEARPATTERN001_PITCH, 0, 0) for i in range(1, LINEARPATTERN001_COUNT)]):
        add(pocket025, mode=Mode.SUBTRACT)


solid = part.part
